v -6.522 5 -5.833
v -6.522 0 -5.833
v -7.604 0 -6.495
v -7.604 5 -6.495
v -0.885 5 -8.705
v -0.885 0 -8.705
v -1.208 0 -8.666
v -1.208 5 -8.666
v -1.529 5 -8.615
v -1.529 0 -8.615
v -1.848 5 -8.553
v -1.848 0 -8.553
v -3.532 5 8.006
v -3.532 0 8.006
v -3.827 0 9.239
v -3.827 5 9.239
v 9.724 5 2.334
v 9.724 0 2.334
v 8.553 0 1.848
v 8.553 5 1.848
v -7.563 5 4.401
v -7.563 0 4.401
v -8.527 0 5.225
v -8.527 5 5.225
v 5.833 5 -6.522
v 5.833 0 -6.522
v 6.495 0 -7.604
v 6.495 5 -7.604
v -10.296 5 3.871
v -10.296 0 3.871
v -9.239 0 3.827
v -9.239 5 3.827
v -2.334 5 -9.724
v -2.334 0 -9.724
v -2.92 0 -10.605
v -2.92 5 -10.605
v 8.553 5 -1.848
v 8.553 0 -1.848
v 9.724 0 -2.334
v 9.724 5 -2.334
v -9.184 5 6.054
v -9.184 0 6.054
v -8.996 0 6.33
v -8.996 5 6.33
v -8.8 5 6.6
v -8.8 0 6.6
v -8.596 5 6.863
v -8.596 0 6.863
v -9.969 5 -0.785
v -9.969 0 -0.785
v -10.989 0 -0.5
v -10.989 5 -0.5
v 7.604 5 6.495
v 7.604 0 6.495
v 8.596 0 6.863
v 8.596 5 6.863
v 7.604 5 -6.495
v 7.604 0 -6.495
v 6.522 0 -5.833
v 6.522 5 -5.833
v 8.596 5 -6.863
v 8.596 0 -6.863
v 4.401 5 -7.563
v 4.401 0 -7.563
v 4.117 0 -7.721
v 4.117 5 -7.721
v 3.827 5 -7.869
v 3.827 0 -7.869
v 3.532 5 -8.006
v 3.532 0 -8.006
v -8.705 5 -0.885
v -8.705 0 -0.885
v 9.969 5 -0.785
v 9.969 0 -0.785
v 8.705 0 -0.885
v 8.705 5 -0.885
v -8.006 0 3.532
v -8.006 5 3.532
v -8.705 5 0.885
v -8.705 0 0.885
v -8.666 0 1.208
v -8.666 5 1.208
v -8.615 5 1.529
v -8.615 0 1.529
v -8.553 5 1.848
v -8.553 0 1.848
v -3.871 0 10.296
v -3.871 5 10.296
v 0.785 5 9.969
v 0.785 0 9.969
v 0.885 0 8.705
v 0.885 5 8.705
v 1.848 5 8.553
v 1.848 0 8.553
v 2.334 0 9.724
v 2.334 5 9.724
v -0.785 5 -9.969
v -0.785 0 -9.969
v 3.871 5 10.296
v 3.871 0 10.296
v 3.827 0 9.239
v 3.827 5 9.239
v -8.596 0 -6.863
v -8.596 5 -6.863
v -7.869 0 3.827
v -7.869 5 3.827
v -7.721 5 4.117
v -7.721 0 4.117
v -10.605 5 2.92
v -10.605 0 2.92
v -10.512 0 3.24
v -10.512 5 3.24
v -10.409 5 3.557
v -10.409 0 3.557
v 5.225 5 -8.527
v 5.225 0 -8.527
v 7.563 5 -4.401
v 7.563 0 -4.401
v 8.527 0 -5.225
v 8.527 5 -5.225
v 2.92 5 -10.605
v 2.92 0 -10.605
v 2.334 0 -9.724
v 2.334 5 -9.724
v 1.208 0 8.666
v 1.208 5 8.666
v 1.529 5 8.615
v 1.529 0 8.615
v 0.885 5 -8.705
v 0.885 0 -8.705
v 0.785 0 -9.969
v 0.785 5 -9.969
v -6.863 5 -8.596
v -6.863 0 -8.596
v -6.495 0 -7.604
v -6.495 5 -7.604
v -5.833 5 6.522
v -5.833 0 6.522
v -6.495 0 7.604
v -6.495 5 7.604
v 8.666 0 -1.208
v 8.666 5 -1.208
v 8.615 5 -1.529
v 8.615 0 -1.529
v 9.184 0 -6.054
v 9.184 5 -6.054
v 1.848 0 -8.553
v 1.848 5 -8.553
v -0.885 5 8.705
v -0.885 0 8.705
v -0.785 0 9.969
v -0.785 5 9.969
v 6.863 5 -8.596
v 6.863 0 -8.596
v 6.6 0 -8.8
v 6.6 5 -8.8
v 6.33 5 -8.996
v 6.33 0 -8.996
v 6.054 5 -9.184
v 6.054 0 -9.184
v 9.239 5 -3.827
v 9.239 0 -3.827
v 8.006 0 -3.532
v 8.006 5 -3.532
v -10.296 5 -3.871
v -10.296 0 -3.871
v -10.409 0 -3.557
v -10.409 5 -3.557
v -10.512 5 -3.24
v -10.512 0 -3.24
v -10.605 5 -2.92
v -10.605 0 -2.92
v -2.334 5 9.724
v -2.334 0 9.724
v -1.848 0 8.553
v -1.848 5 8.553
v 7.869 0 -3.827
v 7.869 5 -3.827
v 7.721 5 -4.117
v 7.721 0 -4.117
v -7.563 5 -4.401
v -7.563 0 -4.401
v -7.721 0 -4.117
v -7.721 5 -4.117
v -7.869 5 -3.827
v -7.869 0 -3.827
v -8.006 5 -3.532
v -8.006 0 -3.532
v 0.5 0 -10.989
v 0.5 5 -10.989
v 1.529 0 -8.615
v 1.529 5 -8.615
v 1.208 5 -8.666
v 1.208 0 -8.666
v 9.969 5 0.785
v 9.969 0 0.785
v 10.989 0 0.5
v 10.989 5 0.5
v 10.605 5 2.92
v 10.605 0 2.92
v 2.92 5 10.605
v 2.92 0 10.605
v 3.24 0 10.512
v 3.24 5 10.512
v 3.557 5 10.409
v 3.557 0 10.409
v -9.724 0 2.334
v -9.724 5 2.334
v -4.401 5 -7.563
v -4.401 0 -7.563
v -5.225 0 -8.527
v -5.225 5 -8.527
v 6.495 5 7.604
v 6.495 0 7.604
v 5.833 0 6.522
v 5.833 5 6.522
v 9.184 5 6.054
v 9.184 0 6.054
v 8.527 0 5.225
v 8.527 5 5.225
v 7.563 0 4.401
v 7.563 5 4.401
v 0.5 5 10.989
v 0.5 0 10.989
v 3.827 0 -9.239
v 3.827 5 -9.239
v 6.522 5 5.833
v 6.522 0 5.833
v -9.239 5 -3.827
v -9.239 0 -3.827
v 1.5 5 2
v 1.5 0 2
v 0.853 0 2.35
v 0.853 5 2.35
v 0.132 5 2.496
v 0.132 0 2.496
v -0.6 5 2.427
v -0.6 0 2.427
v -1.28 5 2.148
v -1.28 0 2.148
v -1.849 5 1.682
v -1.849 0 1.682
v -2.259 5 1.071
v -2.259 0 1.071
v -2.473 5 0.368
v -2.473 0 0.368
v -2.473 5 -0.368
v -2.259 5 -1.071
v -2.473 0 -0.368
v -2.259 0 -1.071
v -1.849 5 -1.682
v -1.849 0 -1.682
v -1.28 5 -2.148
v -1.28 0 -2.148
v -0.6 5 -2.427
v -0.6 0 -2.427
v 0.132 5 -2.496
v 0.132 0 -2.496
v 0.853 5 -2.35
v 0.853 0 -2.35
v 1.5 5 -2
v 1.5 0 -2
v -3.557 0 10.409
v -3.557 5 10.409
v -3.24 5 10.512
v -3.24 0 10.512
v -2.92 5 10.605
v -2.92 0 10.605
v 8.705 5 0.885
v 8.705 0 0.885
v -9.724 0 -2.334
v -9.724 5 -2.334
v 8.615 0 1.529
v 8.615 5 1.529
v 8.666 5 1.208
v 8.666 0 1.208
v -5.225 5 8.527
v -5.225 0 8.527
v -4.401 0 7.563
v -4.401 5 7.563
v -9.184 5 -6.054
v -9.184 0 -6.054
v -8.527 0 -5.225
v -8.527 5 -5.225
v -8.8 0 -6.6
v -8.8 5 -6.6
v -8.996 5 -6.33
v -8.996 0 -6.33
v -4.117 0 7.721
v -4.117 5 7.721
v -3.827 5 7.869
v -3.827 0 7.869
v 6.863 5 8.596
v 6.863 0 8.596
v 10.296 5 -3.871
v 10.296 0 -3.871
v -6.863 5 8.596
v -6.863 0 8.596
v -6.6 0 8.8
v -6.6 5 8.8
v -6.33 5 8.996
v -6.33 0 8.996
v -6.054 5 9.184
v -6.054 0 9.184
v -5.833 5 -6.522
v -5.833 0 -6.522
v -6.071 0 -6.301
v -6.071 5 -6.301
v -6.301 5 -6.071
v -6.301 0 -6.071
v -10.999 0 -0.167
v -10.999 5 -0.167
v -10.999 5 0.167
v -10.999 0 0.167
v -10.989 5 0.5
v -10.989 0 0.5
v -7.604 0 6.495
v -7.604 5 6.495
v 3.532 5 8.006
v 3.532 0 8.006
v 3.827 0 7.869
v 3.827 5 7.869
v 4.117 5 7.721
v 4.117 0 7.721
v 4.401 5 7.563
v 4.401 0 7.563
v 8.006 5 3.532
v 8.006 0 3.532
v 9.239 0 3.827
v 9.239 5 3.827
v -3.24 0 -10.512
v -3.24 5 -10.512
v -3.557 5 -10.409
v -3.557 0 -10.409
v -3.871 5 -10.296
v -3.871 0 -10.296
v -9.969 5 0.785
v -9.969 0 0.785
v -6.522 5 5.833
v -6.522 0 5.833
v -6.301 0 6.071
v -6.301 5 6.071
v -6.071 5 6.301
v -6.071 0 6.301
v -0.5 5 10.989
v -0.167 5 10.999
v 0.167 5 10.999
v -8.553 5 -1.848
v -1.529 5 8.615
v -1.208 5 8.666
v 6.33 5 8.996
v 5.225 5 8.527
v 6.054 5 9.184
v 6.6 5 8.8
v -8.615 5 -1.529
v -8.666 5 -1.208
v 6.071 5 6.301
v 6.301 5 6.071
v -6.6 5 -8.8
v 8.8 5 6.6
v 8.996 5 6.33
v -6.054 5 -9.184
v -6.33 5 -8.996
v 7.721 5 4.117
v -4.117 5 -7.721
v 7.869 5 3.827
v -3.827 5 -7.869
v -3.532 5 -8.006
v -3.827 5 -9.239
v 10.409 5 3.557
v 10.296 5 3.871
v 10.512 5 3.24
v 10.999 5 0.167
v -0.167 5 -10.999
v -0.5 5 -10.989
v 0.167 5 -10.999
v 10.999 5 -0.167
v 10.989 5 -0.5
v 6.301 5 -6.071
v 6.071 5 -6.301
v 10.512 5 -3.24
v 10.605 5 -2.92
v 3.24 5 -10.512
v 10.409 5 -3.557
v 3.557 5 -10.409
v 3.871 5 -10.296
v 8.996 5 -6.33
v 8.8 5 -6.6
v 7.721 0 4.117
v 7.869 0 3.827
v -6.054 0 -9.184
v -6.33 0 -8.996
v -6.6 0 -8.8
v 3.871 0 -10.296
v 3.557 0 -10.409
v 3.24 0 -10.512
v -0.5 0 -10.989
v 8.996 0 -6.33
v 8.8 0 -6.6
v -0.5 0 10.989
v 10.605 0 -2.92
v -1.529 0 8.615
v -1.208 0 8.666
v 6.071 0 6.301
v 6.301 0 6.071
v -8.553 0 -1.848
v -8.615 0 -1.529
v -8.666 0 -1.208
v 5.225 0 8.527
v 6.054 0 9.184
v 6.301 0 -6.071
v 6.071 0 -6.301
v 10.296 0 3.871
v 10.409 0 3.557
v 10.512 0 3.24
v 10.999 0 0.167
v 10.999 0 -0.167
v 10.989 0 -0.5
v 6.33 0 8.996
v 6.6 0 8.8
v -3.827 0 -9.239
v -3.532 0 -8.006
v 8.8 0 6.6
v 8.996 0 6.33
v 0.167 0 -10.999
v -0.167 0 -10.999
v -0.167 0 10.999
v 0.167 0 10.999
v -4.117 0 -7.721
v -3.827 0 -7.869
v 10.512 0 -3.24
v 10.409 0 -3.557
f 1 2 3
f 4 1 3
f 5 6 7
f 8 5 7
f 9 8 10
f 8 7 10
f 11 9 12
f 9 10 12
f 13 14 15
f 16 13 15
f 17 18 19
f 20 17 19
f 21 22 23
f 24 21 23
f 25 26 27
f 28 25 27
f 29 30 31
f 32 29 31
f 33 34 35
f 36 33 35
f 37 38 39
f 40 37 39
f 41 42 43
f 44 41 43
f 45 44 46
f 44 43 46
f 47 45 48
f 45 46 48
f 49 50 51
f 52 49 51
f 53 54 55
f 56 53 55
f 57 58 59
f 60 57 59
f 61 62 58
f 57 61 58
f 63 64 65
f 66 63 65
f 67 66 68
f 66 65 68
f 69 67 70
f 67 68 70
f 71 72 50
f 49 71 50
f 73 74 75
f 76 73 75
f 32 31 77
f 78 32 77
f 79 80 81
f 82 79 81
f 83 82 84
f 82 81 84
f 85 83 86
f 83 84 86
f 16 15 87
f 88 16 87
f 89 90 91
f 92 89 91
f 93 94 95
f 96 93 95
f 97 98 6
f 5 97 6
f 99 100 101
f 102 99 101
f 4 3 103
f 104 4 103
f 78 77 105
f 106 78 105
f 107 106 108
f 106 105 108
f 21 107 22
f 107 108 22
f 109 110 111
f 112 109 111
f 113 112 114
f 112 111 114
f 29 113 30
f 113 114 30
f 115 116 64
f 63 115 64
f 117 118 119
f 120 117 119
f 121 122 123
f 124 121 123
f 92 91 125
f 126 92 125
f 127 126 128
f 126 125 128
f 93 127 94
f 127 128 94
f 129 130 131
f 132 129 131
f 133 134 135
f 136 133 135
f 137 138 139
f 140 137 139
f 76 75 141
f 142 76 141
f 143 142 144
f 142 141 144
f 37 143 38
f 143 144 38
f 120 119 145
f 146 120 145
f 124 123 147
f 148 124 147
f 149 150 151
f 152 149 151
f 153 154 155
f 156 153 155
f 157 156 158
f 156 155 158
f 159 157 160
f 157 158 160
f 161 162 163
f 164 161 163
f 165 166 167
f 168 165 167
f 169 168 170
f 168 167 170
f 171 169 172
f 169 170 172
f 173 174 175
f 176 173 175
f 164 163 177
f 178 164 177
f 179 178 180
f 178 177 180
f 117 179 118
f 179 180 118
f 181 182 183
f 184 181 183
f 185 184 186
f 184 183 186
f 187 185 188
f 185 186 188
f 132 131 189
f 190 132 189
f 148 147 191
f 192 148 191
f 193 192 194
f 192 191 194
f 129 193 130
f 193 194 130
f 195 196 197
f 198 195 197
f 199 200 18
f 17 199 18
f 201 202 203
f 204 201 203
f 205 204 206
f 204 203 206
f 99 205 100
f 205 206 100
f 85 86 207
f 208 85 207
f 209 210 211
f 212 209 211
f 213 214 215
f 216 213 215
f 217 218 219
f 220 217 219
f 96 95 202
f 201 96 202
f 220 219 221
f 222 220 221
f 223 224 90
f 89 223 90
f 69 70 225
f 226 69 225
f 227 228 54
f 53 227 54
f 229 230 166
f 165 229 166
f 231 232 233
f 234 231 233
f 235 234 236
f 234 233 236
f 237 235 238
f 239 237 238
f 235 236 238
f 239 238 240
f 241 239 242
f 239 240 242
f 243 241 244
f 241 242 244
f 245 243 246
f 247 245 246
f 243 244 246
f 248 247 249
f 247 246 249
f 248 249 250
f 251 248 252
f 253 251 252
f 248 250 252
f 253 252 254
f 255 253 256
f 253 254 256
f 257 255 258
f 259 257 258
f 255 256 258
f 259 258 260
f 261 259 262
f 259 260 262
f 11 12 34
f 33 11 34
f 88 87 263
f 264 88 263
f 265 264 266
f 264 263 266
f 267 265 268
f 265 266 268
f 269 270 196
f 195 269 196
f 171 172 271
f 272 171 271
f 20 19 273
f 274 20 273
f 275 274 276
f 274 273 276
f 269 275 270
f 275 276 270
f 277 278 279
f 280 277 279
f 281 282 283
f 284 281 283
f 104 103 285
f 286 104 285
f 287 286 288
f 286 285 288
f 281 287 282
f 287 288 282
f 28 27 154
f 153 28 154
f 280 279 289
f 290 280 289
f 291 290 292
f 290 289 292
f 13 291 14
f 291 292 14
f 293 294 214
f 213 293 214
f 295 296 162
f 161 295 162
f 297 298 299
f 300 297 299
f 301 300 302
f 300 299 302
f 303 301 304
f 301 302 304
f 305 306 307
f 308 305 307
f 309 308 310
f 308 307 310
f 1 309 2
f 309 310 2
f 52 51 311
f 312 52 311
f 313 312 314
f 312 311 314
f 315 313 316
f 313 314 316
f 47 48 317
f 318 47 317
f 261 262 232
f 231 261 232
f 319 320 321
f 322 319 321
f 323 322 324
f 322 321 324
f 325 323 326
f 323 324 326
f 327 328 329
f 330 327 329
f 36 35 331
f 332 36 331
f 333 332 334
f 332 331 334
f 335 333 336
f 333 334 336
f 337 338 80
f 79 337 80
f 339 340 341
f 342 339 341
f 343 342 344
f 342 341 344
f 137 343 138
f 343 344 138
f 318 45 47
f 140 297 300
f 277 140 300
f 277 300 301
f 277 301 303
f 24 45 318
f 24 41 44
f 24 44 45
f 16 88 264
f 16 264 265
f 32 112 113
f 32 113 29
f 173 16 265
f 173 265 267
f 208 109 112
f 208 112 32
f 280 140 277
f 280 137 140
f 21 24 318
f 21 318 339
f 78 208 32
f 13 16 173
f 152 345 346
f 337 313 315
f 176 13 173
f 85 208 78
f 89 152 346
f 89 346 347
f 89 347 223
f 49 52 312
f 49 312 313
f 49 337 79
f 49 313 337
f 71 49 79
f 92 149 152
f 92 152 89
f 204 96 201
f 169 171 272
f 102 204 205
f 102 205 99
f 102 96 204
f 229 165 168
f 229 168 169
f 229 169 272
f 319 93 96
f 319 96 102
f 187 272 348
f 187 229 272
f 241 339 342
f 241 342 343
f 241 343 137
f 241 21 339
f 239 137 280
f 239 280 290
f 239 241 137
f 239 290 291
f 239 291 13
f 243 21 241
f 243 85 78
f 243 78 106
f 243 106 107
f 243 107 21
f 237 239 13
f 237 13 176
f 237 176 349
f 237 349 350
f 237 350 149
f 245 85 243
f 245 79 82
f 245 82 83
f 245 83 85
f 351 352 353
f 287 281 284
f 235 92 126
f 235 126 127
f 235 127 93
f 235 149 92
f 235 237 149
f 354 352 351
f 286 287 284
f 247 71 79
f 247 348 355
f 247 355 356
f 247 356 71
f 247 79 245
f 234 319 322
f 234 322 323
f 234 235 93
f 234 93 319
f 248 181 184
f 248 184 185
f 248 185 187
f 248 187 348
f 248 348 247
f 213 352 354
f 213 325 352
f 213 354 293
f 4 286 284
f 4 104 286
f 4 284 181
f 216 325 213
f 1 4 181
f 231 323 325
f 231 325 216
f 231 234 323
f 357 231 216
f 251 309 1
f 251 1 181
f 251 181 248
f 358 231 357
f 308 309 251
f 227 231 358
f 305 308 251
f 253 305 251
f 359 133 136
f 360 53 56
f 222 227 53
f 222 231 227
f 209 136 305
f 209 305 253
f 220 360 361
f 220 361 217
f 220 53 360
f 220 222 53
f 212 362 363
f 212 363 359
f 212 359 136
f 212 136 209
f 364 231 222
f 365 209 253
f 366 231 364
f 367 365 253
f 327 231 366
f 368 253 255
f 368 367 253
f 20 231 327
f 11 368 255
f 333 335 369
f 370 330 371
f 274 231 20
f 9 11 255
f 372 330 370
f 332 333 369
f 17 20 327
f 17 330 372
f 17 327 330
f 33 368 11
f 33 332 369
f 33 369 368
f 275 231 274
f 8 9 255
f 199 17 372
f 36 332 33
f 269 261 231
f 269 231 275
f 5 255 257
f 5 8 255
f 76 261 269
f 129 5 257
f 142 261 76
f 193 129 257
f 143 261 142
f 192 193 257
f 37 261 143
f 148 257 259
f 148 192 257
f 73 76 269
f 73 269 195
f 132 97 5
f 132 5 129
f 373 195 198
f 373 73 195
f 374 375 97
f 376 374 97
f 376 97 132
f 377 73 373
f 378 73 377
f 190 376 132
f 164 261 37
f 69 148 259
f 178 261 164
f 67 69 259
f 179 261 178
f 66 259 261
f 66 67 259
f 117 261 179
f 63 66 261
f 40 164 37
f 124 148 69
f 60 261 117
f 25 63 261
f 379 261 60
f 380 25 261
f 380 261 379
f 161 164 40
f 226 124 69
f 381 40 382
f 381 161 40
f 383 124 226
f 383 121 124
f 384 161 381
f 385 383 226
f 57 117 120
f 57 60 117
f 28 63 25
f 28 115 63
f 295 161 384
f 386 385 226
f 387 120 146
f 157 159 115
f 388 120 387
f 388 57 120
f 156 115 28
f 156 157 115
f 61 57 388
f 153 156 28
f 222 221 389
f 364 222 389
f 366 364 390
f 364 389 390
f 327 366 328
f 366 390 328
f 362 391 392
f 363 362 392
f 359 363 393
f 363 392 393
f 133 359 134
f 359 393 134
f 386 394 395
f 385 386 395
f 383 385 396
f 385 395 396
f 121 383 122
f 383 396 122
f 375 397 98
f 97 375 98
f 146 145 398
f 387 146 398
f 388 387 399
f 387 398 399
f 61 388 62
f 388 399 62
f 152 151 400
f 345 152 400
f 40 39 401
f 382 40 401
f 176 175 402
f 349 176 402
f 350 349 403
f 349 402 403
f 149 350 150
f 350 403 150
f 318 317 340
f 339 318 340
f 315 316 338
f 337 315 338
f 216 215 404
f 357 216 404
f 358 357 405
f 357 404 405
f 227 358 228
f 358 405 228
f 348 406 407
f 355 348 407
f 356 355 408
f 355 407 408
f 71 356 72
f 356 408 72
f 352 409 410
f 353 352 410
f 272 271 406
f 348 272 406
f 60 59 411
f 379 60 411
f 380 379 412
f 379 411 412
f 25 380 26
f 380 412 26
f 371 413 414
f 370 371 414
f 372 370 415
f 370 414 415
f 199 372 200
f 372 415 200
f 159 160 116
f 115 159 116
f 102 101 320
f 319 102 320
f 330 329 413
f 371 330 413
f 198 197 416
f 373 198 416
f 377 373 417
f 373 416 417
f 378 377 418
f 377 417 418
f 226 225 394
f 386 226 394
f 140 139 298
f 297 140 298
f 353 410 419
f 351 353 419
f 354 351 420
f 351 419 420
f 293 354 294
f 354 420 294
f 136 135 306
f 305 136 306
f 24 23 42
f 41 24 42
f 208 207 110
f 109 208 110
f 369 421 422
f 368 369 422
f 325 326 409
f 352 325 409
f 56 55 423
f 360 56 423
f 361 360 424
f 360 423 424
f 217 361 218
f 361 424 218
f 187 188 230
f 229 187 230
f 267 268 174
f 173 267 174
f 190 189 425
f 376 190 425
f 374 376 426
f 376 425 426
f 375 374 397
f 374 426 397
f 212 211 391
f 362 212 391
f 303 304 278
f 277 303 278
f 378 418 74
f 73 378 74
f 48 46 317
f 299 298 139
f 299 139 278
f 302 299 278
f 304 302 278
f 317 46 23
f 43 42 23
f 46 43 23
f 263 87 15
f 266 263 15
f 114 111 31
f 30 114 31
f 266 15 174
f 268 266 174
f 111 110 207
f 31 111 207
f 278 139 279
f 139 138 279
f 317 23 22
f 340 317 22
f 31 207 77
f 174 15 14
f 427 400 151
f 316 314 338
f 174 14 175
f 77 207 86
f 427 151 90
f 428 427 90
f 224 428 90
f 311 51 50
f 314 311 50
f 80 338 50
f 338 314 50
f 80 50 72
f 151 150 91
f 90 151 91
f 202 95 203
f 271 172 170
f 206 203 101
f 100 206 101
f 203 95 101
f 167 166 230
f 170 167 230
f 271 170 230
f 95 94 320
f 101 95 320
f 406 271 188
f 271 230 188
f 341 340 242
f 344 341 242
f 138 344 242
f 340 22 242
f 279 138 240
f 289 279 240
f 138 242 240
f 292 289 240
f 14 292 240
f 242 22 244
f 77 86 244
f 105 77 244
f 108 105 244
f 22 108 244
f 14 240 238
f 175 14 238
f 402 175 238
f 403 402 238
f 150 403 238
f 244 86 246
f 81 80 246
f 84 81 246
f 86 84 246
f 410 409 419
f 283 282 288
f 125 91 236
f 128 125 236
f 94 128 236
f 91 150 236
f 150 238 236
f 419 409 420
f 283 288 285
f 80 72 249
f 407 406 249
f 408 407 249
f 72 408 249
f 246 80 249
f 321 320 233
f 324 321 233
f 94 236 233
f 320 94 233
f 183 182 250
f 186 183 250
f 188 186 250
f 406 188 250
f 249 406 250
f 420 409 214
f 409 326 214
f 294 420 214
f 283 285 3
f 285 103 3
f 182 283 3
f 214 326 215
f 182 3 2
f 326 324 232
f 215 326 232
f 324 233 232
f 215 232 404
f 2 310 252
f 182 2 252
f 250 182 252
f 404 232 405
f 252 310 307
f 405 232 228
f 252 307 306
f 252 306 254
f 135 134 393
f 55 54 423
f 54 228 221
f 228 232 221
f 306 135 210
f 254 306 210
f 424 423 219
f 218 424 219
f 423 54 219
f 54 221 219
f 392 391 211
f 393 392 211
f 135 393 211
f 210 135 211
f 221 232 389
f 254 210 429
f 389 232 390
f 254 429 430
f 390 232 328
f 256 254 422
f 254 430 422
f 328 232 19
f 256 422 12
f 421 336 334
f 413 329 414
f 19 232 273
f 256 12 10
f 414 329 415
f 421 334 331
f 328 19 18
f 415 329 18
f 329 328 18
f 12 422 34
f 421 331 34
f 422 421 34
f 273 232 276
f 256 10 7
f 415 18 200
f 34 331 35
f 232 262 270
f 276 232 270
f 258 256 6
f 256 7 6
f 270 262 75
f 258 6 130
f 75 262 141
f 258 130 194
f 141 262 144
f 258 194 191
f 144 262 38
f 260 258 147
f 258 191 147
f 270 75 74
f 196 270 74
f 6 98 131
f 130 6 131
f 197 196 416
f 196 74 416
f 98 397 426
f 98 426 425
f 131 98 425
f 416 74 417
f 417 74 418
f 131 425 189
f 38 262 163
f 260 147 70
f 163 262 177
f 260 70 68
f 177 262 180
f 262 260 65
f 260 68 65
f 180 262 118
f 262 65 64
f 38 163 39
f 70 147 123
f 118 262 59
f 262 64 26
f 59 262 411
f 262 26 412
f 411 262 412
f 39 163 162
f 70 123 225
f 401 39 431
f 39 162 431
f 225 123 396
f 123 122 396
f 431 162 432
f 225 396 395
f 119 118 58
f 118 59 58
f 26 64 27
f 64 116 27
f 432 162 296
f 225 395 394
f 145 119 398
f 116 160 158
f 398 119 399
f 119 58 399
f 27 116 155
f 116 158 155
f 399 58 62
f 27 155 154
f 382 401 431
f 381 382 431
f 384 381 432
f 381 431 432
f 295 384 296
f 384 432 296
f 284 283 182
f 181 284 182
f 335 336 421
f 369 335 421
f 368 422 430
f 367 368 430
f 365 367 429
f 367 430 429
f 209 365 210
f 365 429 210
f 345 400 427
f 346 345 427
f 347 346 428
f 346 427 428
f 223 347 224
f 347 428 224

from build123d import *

# Parameters (mm, degrees)
BOSS_EXTRUDE1_DEPTH = 5


with BuildPart() as part:
    # Sketch1 → Boss-Extrude1 (new body)
    with BuildSketch(Plane(origin=(0, 0, 0), x_dir=(1, 0, 0), z_dir=(0, 1, 0))):
        with BuildLine():
            Line((0.885, 8.705129235), (0.785, 9.969141137))
            Line((0.785, 9.969141137), (0.5, 10.988630488))
            ThreePointArc((0.5, 10.988630488), (0, 11), (-0.5, 10.988630488))
            Line((-0.5, 10.988630488), (-0.785, 9.969141137))
            Line((-0.785, 9.969141137), (-0.885, 8.705129235))
            ThreePointArc((-0.885, 8.705129235), (-1.368801569, 8.64227298), (-1.848347855, 8.552549924))
            Line((-1.848347855, 8.552549924), (-2.334054665, 9.72379498))
            Line((-2.334054665, 9.72379498), (-2.920145308, 10.605317128))
            ThreePointArc((-2.920145308, 10.605317128), (-3.399186938, 10.461621679), (-3.871201824, 10.296300134))
            Line((-3.871201824, 10.296300134), (-3.827213396, 9.238638299))
            Line((-3.827213396, 9.238638299), (-3.531717889, 8.005589844))
            ThreePointArc((-3.531717889, 8.005589844), (-3.972416873, 7.796307087), (-4.400766544, 7.562787438))
            Line((-4.400766544, 7.562787438), (-5.224635797, 8.526616022))
            Line((-5.224635797, 8.526616022), (-6.054446447, 9.183881436))
            ThreePointArc((-6.054446447, 9.183881436), (-6.465637775, 8.899186938), (-6.863463441, 8.596096183))
            Line((-6.863463441, 8.596096183), (-6.494792479, 7.603793176))
            Line((-6.494792479, 7.603793176), (-5.832726624, 6.522407541))
            ThreePointArc((-5.832726624, 6.522407541), (-6.187184335, 6.187184335), (-6.522407541, 5.832726624))
            Line((-6.522407541, 5.832726624), (-7.603793176, 6.494792479))
            Line((-7.603793176, 6.494792479), (-8.596096183, 6.863463441))
            ThreePointArc((-8.596096183, 6.863463441), (-8.899186938, 6.465637775), (-9.183881436, 6.054446447))
            Line((-9.183881436, 6.054446447), (-8.526616022, 5.224635797))
            Line((-8.526616022, 5.224635797), (-7.562787438, 4.400766544))
            ThreePointArc((-7.562787438, 4.400766544), (-7.796307087, 3.972416873), (-8.005589844, 3.531717889))
            Line((-8.005589844, 3.531717889), (-9.238638299, 3.827213396))
            Line((-9.238638299, 3.827213396), (-10.296300134, 3.871201824))
            ThreePointArc((-10.296300134, 3.871201824), (-10.461621679, 3.399186938), (-10.605317128, 2.920145308))
            Line((-10.605317128, 2.920145308), (-9.72379498, 2.334054665))
            Line((-9.72379498, 2.334054665), (-8.552549924, 1.848347855))
            ThreePointArc((-8.552549924, 1.848347855), (-8.64227298, 1.368801569), (-8.705129235, 0.885))
            Line((-8.705129235, 0.885), (-9.969141137, 0.785))
            Line((-9.969141137, 0.785), (-10.988630488, 0.5))
            ThreePointArc((-10.988630488, 0.5), (-11, 0), (-10.988630488, -0.5))
            Line((-10.988630488, -0.5), (-9.969141137, -0.785))
            Line((-9.969141137, -0.785), (-8.705129235, -0.885))
            ThreePointArc((-8.705129235, -0.885), (-8.64227298, -1.368801569), (-8.552549924, -1.848347855))
            Line((-8.552549924, -1.848347855), (-9.72379498, -2.334054665))
            Line((-9.72379498, -2.334054665), (-10.605317128, -2.920145308))
            ThreePointArc((-10.605317128, -2.920145308), (-10.461621679, -3.399186938), (-10.296300134, -3.871201824))
            Line((-10.296300134, -3.871201824), (-9.238638299, -3.827213396))
            Line((-9.238638299, -3.827213396), (-8.005589844, -3.531717889))
            ThreePointArc((-8.005589844, -3.531717889), (-7.796307087, -3.972416873), (-7.562787438, -4.400766544))
            Line((-7.562787438, -4.400766544), (-8.526616022, -5.224635797))
            Line((-8.526616022, -5.224635797), (-9.183881436, -6.054446447))
            ThreePointArc((-9.183881436, -6.054446447), (-8.899186938, -6.465637775), (-8.596096183, -6.863463441))
            Line((-8.596096183, -6.863463441), (-7.603793176, -6.494792479))
            Line((-7.603793176, -6.494792479), (-6.522407541, -5.832726624))
            ThreePointArc((-6.522407541, -5.832726624), (-6.187184335, -6.187184335), (-5.832726624, -6.522407541))
            Line((-5.832726624, -6.522407541), (-6.494792479, -7.603793176))
            Line((-6.494792479, -7.603793176), (-6.863463441, -8.596096183))
            ThreePointArc((-6.863463441, -8.596096183), (-6.465637775, -8.899186938), (-6.054446447, -9.183881436))
            Line((-6.054446447, -9.183881436), (-5.224635797, -8.526616022))
            Line((-5.224635797, -8.526616022), (-4.400766544, -7.562787438))
            ThreePointArc((-4.400766544, -7.562787438), (-3.972416873, -7.796307087), (-3.531717889, -8.005589844))
            Line((-3.531717889, -8.005589844), (-3.827213396, -9.238638299))
            Line((-3.827213396, -9.238638299), (-3.871201824, -10.296300134))
            ThreePointArc((-3.871201824, -10.296300134), (-3.399186938, -10.461621679), (-2.920145308, -10.605317128))
            Line((-2.920145308, -10.605317128), (-2.334054665, -9.72379498))
            Line((-2.334054665, -9.72379498), (-1.848347855, -8.552549924))
            ThreePointArc((-1.848347855, -8.552549924), (-1.368801569, -8.64227298), (-0.885, -8.705129235))
            Line((-0.885, -8.705129235), (-0.785, -9.969141137))
            Line((-0.785, -9.969141137), (-0.5, -10.988630488))
            ThreePointArc((-0.5, -10.988630488), (0, -11), (0.5, -10.988630488))
            Line((0.5, -10.988630488), (0.785, -9.969141137))
            Line((0.785, -9.969141137), (0.885, -8.705129235))
            ThreePointArc((0.885, -8.705129235), (1.368801569, -8.64227298), (1.848347855, -8.552549924))
            Line((1.848347855, -8.552549924), (2.334054665, -9.72379498))
            Line((2.334054665, -9.72379498), (2.920145308, -10.605317128))
            ThreePointArc((2.920145308, -10.605317128), (3.399186938, -10.461621679), (3.871201824, -10.296300134))
            Line((3.871201824, -10.296300134), (3.827213396, -9.238638299))
            Line((3.827213396, -9.238638299), (3.531717889, -8.005589844))
            ThreePointArc((3.531717889, -8.005589844), (3.972416873, -7.796307087), (4.400766544, -7.562787438))
            Line((4.400766544, -7.562787438), (5.224635797, -8.526616022))
            Line((5.224635797, -8.526616022), (6.054446447, -9.183881436))
            ThreePointArc((6.054446447, -9.183881436), (6.465637775, -8.899186938), (6.863463441, -8.596096183))
            Line((6.863463441, -8.596096183), (6.494792479, -7.603793176))
            Line((6.494792479, -7.603793176), (5.832726624, -6.522407541))
            ThreePointArc((5.832726624, -6.522407541), (6.187184335, -6.187184335), (6.522407541, -5.832726624))
            Line((6.522407541, -5.832726624), (7.603793176, -6.494792479))
            Line((7.603793176, -6.494792479), (8.596096183, -6.863463441))
            ThreePointArc((8.596096183, -6.863463441), (8.899186938, -6.465637775), (9.183881436, -6.054446447))
            Line((9.183881436, -6.054446447), (8.526616022, -5.224635797))
            Line((8.526616022, -5.224635797), (7.562787438, -4.400766544))
            ThreePointArc((7.562787438, -4.400766544), (7.796307087, -3.972416873), (8.005589844, -3.531717889))
            Line((8.005589844, -3.531717889), (9.238638299, -3.827213396))
            Line((9.238638299, -3.827213396), (10.296300134, -3.871201824))
            ThreePointArc((10.296300134, -3.871201824), (10.461621679, -3.399186938), (10.605317128, -2.920145308))
            Line((10.605317128, -2.920145308), (9.72379498, -2.334054665))
            Line((9.72379498, -2.334054665), (8.552549924, -1.848347855))
            ThreePointArc((8.552549924, -1.848347855), (8.64227298, -1.368801569), (8.705129235, -0.885))
            Line((8.705129235, -0.885), (9.969141137, -0.785))
            Line((9.969141137, -0.785), (10.988630488, -0.5))
            ThreePointArc((10.988630488, -0.5), (11, 0), (10.988630488, 0.5))
            Line((10.988630488, 0.5), (9.969141137, 0.785))
            Line((9.969141137, 0.785), (8.705129235, 0.885))
            ThreePointArc((8.705129235, 0.885), (8.64227298, 1.368801569), (8.552549924, 1.848347855))
            Line((8.552549924, 1.848347855), (9.72379498, 2.334054665))
            Line((9.72379498, 2.334054665), (10.605317128, 2.920145308))
            ThreePointArc((10.605317128, 2.920145308), (10.461621679, 3.399186938), (10.296300134, 3.871201824))
            Line((10.296300134, 3.871201824), (9.238638299, 3.827213396))
            Line((9.238638299, 3.827213396), (8.005589844, 3.531717889))
            ThreePointArc((8.005589844, 3.531717889), (7.796307087, 3.972416873), (7.562787438, 4.400766544))
            Line((7.562787438, 4.400766544), (8.526616022, 5.224635797))
            Line((8.526616022, 5.224635797), (9.183881436, 6.054446447))
            ThreePointArc((9.183881436, 6.054446447), (8.899186938, 6.465637775), (8.596096183, 6.863463441))
            Line((8.596096183, 6.863463441), (7.603793176, 6.494792479))
            Line((7.603793176, 6.494792479), (6.522407541, 5.832726624))
            ThreePointArc((6.522407541, 5.832726624), (6.187184335, 6.187184335), (5.832726624, 6.522407541))
            Line((5.832726624, 6.522407541), (6.494792479, 7.603793176))
            Line((6.494792479, 7.603793176), (6.863463441, 8.596096183))
            ThreePointArc((6.863463441, 8.596096183), (6.465637775, 8.899186938), (6.054446447, 9.183881436))
            Line((6.054446447, 9.183881436), (5.224635797, 8.526616022))
            Line((5.224635797, 8.526616022), (4.400766544, 7.562787438))
            ThreePointArc((4.400766544, 7.562787438), (3.972416873, 7.796307087), (3.531717889, 8.005589844))
            Line((3.531717889, 8.005589844), (3.827213396, 9.238638299))
            Line((3.827213396, 9.238638299), (3.871201824, 10.296300134))
            ThreePointArc((3.871201824, 10.296300134), (3.399186938, 10.461621679), (2.920145308, 10.605317128))
            Line((2.920145308, 10.605317128), (2.334054665, 9.72379498))
            Line((2.334054665, 9.72379498), (1.848347855, 8.552549924))
            ThreePointArc((1.848347855, 8.552549924), (1.368801569, 8.64227298), (0.885, 8.705129235))
        make_face()
        with BuildLine():
            Line((1.5, 2), (1.5, -2))
            ThreePointArc((1.5, -2), (-2.5, 0), (1.5, 2))
        make_face(mode=Mode.SUBTRACT)
    extrude(amount=BOSS_EXTRUDE1_DEPTH)


solid = part.part
